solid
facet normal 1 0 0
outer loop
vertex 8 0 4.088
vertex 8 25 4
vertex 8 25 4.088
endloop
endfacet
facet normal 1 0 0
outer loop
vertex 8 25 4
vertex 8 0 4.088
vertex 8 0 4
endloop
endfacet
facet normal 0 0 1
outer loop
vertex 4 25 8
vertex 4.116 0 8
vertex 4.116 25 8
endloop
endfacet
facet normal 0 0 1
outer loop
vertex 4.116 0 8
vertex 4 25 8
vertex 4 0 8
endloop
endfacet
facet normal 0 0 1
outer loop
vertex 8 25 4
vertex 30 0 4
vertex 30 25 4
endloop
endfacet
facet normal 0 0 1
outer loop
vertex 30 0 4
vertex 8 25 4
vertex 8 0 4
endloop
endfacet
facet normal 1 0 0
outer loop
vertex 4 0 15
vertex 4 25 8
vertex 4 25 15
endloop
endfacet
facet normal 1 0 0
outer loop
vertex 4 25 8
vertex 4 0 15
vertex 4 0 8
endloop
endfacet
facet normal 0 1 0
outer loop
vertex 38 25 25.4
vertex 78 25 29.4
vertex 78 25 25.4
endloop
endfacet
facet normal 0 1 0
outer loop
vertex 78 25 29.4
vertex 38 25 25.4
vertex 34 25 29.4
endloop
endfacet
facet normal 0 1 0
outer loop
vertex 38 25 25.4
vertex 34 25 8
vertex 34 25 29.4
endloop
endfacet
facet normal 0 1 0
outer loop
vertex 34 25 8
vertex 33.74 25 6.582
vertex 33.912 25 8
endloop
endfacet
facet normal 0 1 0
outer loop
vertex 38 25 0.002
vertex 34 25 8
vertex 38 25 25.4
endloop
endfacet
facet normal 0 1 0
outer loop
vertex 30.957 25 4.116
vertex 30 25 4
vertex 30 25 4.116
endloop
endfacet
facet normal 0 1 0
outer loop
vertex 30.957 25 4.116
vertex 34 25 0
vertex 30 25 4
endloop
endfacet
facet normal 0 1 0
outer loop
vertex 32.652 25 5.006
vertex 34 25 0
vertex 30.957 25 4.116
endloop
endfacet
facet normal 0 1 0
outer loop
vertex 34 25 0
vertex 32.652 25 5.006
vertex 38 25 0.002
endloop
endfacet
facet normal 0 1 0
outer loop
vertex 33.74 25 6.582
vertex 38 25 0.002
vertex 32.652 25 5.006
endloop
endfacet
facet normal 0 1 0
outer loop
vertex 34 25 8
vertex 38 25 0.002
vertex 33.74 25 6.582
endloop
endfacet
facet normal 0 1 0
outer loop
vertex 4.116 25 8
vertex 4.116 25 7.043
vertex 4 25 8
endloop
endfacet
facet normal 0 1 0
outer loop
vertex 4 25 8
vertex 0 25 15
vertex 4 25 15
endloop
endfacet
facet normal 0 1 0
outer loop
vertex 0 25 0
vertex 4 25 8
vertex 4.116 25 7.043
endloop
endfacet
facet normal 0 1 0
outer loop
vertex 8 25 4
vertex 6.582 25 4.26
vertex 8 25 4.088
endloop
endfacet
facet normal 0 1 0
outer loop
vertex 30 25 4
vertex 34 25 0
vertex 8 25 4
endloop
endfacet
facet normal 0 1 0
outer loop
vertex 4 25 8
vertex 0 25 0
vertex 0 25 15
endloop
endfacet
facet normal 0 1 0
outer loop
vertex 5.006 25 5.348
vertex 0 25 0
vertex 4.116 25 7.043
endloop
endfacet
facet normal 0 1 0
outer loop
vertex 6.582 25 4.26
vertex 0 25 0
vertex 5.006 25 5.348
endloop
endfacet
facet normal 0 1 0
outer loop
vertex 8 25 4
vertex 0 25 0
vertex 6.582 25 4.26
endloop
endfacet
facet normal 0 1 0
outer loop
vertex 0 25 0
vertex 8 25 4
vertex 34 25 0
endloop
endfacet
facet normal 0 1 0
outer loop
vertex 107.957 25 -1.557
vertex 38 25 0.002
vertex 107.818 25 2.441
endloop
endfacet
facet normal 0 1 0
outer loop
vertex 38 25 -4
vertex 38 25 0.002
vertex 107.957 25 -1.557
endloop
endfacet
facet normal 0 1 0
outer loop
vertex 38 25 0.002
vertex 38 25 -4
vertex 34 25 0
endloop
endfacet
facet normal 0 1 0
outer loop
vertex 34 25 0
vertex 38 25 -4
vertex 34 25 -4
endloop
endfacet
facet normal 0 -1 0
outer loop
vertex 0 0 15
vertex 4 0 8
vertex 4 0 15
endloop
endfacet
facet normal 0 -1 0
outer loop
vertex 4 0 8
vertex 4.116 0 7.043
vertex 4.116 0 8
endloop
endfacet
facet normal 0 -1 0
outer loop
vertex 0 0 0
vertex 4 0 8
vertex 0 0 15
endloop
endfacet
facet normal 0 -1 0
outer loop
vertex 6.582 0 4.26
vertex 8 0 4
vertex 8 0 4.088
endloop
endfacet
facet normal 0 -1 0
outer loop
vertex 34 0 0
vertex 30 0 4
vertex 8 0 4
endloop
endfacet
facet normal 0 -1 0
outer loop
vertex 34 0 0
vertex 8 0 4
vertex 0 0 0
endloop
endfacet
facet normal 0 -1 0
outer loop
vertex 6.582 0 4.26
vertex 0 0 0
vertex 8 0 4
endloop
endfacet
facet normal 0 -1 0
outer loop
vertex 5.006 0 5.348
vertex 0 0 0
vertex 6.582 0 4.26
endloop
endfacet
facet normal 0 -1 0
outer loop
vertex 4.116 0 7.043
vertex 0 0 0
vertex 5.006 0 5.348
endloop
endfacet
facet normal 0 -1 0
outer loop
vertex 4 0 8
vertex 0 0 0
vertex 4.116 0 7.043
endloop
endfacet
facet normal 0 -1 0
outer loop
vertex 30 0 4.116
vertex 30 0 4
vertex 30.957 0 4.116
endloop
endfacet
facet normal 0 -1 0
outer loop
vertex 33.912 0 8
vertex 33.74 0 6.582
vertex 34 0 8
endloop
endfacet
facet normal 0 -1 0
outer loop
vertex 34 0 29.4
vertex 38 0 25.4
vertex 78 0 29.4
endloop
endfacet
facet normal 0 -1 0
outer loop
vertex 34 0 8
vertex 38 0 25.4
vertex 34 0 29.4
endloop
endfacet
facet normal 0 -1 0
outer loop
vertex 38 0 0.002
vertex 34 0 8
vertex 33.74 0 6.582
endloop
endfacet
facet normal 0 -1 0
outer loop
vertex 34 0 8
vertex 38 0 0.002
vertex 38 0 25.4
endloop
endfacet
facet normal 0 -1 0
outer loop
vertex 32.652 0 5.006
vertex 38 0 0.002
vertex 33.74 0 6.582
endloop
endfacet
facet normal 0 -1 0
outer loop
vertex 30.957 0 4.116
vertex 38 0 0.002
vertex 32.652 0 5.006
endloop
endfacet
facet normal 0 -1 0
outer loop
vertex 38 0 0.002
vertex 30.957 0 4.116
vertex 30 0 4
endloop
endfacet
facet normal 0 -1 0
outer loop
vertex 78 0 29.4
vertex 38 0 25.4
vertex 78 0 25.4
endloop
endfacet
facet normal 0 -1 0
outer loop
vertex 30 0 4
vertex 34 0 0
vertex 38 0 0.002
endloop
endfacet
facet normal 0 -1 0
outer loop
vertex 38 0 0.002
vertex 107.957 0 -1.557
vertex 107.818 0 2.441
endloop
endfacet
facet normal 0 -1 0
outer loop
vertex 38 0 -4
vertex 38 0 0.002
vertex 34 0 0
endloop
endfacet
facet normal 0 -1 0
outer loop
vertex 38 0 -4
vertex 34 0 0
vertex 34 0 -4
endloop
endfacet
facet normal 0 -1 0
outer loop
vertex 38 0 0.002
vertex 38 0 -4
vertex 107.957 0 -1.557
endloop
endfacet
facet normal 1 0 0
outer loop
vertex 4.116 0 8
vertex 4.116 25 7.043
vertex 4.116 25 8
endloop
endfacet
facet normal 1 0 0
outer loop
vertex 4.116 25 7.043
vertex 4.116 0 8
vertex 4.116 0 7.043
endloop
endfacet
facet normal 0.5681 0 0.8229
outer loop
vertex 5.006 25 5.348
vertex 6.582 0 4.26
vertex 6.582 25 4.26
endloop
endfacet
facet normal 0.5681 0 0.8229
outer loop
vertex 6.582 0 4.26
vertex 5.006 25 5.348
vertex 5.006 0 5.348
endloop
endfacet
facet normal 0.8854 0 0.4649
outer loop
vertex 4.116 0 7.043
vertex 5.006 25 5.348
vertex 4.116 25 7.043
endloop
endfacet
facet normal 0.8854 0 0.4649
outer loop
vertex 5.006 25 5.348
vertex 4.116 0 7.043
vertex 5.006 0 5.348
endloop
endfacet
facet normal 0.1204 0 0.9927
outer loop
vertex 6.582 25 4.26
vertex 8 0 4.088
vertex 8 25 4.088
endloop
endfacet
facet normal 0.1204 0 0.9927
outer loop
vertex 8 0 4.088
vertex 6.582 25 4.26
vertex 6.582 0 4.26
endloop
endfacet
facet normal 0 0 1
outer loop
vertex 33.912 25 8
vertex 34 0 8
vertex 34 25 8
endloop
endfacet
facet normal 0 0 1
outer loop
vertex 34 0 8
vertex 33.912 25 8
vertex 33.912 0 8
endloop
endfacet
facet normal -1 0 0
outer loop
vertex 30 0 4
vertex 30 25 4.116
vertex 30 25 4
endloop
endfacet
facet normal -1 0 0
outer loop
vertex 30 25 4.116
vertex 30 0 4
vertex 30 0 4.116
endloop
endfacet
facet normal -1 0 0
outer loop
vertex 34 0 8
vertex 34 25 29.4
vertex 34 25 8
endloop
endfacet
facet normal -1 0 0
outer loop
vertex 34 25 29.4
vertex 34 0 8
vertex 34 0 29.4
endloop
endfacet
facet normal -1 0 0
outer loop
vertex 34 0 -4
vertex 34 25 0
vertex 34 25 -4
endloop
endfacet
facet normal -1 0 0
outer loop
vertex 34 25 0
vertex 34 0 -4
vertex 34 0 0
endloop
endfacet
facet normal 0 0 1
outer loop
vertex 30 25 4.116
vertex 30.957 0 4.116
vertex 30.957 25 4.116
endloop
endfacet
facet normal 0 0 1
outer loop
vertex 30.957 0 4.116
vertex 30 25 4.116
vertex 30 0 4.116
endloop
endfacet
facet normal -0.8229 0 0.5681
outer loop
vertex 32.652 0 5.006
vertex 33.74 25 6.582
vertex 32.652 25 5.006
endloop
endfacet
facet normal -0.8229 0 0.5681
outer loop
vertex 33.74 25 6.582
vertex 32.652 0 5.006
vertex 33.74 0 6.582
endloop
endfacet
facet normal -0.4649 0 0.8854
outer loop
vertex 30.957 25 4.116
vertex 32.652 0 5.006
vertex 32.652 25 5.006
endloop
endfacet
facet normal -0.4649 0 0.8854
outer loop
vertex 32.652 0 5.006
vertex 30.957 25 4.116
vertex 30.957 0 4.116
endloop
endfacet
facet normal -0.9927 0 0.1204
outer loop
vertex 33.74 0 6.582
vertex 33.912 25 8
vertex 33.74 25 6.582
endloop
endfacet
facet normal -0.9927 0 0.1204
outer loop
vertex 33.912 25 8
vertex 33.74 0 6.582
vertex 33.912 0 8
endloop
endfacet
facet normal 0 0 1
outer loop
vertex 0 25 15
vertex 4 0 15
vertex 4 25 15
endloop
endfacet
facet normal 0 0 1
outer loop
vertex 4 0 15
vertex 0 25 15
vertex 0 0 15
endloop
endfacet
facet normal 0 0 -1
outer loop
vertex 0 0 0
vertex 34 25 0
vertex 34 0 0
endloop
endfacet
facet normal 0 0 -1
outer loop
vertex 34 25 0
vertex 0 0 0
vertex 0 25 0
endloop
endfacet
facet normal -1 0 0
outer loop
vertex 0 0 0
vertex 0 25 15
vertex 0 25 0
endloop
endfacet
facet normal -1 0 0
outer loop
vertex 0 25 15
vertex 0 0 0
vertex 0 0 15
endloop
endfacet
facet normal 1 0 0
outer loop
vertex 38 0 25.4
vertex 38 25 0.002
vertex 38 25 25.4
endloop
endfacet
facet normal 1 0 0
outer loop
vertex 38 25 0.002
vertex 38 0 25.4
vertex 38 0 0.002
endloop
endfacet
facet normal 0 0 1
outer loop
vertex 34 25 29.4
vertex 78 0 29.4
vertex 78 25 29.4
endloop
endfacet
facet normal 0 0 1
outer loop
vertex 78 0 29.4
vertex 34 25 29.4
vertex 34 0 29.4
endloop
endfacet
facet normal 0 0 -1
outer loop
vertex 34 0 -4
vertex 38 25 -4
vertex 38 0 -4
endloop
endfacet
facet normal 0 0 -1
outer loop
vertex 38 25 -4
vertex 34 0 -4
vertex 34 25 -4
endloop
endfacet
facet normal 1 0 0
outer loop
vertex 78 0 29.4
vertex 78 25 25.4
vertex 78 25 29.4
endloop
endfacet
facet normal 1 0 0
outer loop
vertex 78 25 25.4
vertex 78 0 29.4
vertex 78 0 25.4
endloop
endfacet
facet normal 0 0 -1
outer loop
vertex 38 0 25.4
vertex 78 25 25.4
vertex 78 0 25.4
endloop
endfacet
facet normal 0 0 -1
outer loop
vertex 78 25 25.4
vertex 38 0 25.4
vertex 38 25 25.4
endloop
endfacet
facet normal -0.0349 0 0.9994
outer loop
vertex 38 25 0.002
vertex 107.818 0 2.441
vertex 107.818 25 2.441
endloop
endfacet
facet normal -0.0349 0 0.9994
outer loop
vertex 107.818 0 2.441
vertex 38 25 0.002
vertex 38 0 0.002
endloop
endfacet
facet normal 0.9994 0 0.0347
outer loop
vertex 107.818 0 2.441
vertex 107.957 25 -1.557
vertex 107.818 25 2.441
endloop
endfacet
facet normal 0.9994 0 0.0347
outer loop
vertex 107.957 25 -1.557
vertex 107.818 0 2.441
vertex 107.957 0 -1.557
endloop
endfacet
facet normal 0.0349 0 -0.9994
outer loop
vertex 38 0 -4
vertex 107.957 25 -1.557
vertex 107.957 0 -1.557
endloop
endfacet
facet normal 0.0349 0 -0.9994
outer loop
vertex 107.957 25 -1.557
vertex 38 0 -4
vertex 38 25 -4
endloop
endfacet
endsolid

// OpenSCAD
// all measurements in mm
deskTopWidth = 25;

hookLength = 30;
hookHeight = 15;

topGrab = 40;
bottomGrab = 70;

grabAngle = 88;

hookWidth = 25;
hookThickness = 4;

// tolerance for desktopWidth based on printer experience
tolerance=0.4;

module Hook() {
    // build and move primitives
    
    cube([hookThickness, hookWidth, hookHeight]);
    cube([hookLength+hookThickness,hookWidth,hookThickness]);
    // add twice the hook thickness to the the height of the gap
    translate ([hookLength+hookThickness,0,-hookThickness])
        cube([hookThickness,hookWidth,deskTopWidth+tolerance+2*hookThickness]);
    translate ([hookThickness*2+hookLength,0,deskTopWidth-hookThickness*2+tolerance+2*hookThickness])
        cube([topGrab,hookWidth,hookThickness]);
    
    // rotate for additional grab about the y axis
    // need to rotate prior to translation otherwise the element will become quite disjointed
    
    // failed to properly account for the grab angle
    translate ([hookThickness*2+hookLength,0,-hookThickness])
        rotate([0,-90+grabAngle,0])
        cube([bottomGrab,hookWidth,hookThickness]);
    
    // round the inside corners
    translate ([hookThickness,0,hookThickness])
        RoundedCorner();
    translate([hookLength+hookThickness,0,hookThickness])
        rotate([0,-90,0])
        RoundedCorner();
}

module RoundedCorner() {
    // modularise the corner and translate back to origin
    translate([hookThickness/2,hookWidth/2,hookThickness/2])
    difference() {
        cube ([hookThickness,hookWidth,hookThickness],center=true);
        translate([hookThickness/2,-hookWidth/4,hookThickness/2])
        rotate([90,0,0])
        cylinder(r=hookThickness,h=hookWidth*2,center=true);
    }
}
// make transparent during rounded corner creation
//rotate([0,0,45])
//rotate([90,0,0])
Hook();
